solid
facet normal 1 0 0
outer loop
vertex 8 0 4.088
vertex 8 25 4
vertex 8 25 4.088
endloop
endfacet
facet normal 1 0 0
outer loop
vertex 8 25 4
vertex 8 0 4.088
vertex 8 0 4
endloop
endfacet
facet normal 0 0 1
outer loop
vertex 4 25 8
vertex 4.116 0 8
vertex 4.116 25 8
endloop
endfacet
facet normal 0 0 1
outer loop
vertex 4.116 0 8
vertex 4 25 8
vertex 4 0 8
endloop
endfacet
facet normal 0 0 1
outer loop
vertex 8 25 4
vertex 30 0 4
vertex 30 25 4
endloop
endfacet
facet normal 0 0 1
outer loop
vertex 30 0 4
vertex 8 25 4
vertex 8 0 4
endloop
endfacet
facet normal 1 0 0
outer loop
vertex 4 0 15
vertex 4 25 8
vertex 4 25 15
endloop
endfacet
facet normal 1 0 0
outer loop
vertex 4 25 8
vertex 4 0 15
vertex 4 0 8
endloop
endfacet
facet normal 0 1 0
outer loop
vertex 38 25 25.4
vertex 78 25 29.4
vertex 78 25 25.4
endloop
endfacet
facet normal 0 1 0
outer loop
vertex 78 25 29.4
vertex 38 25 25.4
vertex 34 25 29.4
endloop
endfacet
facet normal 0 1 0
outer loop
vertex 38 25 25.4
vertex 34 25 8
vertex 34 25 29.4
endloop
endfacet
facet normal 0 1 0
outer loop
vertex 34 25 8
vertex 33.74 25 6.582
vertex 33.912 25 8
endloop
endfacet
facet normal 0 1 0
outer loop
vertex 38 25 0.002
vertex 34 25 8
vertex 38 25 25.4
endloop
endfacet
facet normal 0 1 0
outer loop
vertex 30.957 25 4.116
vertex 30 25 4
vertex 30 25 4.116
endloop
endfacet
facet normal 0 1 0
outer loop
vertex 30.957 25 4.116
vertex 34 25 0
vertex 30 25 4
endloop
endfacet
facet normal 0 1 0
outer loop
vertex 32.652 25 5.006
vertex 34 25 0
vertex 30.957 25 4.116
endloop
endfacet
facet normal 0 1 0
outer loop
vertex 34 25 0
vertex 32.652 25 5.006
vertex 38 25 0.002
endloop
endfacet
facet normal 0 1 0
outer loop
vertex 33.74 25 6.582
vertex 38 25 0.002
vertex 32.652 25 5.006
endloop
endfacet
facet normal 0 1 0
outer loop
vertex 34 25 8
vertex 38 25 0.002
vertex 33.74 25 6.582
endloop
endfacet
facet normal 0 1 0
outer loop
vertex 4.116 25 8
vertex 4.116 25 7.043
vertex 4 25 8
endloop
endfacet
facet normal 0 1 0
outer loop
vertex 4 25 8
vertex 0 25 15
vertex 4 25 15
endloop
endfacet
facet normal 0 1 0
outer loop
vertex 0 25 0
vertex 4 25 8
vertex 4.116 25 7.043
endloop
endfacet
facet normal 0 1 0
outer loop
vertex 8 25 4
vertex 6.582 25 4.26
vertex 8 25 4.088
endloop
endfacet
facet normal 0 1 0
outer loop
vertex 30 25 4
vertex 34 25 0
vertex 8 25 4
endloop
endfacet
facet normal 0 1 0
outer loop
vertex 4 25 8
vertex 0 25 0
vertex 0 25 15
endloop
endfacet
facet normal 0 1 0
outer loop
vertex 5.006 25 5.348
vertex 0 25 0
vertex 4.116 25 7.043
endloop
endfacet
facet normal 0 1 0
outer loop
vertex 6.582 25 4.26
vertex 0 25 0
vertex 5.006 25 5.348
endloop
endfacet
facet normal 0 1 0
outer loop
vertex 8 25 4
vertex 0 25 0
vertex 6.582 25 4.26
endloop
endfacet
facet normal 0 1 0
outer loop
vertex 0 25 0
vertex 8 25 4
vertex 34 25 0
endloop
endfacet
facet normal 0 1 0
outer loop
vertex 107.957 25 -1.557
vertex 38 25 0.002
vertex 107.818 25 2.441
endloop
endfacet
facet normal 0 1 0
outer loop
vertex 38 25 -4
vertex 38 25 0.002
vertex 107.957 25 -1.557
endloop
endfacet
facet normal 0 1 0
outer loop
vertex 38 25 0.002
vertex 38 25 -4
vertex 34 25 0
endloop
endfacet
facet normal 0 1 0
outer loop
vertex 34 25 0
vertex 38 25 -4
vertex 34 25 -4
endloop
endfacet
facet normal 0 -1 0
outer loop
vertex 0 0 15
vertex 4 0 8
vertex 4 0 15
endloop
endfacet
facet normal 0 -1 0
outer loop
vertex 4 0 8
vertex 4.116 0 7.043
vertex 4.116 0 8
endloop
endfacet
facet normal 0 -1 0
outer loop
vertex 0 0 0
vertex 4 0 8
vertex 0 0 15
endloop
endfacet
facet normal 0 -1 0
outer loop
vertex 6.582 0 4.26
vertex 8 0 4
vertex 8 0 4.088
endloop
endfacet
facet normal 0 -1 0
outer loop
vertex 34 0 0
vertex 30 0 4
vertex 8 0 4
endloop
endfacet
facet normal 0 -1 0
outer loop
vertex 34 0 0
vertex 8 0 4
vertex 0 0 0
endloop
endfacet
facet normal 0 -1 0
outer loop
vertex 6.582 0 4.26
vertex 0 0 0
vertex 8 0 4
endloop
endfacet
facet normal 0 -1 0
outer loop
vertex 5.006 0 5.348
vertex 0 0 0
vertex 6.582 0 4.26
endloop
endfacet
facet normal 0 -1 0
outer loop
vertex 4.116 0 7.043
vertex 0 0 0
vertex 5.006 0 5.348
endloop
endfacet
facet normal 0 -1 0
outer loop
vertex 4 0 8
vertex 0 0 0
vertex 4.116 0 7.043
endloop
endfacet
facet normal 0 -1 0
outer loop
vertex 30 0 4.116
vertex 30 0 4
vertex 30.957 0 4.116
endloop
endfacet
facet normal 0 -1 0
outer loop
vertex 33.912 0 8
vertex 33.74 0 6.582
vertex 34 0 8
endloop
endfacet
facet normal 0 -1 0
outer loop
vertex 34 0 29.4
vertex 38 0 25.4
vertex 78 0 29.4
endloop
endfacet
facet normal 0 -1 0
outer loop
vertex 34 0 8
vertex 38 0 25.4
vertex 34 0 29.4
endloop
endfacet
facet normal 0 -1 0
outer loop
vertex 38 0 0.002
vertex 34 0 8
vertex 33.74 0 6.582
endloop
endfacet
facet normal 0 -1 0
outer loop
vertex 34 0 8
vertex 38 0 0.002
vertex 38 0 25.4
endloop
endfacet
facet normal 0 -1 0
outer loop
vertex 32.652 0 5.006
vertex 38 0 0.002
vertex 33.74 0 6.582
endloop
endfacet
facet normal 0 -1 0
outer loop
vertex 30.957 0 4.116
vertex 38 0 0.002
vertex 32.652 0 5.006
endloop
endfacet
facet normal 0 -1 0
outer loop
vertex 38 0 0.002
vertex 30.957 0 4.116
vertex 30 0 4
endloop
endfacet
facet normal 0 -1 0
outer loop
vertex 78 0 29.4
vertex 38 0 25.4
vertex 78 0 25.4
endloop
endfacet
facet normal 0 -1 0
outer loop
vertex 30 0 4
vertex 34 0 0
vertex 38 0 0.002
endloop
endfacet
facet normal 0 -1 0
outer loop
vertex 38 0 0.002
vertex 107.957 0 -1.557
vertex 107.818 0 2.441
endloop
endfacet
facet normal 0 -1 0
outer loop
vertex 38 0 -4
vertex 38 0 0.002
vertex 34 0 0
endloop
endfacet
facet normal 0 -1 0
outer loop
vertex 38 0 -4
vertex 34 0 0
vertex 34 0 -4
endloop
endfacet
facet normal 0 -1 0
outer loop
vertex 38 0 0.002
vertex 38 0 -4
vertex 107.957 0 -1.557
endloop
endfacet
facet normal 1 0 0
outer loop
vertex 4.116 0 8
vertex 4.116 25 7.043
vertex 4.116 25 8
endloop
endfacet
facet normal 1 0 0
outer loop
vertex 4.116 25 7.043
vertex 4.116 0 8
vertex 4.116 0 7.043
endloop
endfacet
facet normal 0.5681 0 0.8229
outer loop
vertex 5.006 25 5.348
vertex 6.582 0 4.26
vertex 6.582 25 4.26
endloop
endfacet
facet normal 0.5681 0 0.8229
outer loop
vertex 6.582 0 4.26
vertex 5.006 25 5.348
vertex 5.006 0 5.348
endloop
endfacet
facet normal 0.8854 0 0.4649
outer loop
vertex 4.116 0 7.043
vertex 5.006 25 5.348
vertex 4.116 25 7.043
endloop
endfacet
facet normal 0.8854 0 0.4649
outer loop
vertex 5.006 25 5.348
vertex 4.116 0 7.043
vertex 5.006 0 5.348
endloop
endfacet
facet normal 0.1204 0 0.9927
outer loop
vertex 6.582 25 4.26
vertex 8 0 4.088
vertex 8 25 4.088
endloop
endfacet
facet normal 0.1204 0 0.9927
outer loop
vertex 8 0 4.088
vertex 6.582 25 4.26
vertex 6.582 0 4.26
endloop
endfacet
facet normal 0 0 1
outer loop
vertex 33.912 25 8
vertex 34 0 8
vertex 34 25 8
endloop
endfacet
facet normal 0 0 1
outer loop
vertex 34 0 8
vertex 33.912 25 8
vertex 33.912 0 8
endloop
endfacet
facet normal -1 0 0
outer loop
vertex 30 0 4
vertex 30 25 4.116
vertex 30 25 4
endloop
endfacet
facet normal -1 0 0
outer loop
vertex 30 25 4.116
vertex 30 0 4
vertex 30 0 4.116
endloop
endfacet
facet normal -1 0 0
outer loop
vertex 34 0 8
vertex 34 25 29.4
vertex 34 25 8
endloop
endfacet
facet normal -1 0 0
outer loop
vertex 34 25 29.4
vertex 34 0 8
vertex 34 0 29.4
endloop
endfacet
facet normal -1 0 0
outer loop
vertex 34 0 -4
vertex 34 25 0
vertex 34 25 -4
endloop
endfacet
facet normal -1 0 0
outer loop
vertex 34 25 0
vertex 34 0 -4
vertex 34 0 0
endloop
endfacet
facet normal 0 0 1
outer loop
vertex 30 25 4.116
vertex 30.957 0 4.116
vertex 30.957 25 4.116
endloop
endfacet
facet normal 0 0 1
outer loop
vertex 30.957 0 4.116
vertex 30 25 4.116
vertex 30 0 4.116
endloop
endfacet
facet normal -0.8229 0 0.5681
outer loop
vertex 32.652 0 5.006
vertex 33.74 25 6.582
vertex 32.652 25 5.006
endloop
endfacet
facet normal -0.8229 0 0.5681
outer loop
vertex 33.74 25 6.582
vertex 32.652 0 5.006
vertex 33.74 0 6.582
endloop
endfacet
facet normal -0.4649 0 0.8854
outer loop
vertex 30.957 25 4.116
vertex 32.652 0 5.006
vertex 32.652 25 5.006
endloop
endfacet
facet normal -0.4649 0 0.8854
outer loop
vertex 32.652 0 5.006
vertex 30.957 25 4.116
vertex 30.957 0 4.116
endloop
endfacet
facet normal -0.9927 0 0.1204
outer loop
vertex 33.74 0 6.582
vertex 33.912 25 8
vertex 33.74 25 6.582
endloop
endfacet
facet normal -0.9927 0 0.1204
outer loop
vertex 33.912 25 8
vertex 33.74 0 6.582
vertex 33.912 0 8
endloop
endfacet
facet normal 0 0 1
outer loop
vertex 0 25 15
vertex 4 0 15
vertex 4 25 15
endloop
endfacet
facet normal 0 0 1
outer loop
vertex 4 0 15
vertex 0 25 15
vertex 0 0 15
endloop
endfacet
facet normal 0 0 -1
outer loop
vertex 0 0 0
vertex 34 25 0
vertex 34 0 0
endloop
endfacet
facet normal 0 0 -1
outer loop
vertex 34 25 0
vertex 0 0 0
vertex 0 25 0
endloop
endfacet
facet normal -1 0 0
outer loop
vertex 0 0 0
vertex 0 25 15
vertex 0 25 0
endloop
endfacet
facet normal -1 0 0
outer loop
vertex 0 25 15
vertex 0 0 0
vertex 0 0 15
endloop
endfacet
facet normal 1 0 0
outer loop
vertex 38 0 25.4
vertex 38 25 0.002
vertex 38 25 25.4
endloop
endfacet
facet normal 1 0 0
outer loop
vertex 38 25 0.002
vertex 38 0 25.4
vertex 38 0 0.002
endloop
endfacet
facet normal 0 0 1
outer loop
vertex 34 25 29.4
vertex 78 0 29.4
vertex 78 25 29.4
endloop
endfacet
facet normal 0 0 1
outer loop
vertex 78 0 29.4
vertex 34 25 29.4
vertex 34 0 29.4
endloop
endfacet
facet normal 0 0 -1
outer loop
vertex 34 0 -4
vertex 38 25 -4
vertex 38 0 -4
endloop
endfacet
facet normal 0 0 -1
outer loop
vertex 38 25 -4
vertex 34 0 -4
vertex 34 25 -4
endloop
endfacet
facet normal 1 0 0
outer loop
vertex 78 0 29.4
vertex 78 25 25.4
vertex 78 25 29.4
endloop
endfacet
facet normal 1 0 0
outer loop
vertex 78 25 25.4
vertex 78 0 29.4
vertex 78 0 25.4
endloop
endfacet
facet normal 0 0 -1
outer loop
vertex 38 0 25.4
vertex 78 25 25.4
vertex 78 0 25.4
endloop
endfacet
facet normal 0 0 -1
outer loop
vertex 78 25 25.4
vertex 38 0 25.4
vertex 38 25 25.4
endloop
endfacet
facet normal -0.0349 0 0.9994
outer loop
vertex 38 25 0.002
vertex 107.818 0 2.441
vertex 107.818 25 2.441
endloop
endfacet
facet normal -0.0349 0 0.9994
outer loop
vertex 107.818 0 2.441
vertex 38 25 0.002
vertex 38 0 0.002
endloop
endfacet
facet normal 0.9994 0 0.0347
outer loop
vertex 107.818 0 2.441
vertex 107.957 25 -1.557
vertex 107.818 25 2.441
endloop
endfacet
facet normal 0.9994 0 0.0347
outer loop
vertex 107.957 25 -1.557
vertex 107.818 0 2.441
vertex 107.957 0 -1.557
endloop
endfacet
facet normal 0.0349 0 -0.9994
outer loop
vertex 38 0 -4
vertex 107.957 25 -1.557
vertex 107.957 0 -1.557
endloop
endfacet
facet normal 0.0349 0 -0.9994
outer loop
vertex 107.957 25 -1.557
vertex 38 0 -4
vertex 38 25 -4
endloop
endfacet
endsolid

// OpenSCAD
// all measurements in mm
deskTopWidth = 25;

hookLength = 30;
hookHeight = 15;

topGrab = 40;
bottomGrab = 70;

grabAngle = 88;

hookWidth = 25;
hookThickness = 4;

// tolerance for desktopWidth based on printer experience
tolerance=0.4;

module Hook() {
    // build and move primitives
    
    cube([hookThickness, hookWidth, hookHeight]);
    cube([hookLength+hookThickness,hookWidth,hookThickness]);
    // add twice the hook thickness to the the height of the gap
    translate ([hookLength+hookThickness,0,-hookThickness])
        cube([hookThickness,hookWidth,deskTopWidth+tolerance+2*hookThickness]);
    translate ([hookThickness*2+hookLength,0,deskTopWidth-hookThickness*2+tolerance+2*hookThickness])
        cube([topGrab,hookWidth,hookThickness]);
    
    // rotate for additional grab about the y axis
    // need to rotate prior to translation otherwise the element will become quite disjointed
    
    // failed to properly account for the grab angle
    translate ([hookThickness*2+hookLength,0,-hookThickness])
        rotate([0,-90+grabAngle,0])
        cube([bottomGrab,hookWidth,hookThickness]);
    
    // round the inside corners
    translate ([hookThickness,0,hookThickness])
        RoundedCorner();
    translate([hookLength+hookThickness,0,hookThickness])
        rotate([0,-90,0])
        RoundedCorner();
}

module RoundedCorner() {
    // modularise the corner and translate back to origin
    translate([hookThickness/2,hookWidth/2,hookThickness/2])
    difference() {
        cube ([hookThickness,hookWidth,hookThickness],center=true);
        translate([hookThickness/2,-hookWidth/4,hookThickness/2])
        rotate([90,0,0])
        cylinder(r=hookThickness,h=hookWidth*2,center=true);
    }
}
// make transparent during rounded corner creation
//rotate([0,0,45])
//rotate([90,0,0])
Hook();
